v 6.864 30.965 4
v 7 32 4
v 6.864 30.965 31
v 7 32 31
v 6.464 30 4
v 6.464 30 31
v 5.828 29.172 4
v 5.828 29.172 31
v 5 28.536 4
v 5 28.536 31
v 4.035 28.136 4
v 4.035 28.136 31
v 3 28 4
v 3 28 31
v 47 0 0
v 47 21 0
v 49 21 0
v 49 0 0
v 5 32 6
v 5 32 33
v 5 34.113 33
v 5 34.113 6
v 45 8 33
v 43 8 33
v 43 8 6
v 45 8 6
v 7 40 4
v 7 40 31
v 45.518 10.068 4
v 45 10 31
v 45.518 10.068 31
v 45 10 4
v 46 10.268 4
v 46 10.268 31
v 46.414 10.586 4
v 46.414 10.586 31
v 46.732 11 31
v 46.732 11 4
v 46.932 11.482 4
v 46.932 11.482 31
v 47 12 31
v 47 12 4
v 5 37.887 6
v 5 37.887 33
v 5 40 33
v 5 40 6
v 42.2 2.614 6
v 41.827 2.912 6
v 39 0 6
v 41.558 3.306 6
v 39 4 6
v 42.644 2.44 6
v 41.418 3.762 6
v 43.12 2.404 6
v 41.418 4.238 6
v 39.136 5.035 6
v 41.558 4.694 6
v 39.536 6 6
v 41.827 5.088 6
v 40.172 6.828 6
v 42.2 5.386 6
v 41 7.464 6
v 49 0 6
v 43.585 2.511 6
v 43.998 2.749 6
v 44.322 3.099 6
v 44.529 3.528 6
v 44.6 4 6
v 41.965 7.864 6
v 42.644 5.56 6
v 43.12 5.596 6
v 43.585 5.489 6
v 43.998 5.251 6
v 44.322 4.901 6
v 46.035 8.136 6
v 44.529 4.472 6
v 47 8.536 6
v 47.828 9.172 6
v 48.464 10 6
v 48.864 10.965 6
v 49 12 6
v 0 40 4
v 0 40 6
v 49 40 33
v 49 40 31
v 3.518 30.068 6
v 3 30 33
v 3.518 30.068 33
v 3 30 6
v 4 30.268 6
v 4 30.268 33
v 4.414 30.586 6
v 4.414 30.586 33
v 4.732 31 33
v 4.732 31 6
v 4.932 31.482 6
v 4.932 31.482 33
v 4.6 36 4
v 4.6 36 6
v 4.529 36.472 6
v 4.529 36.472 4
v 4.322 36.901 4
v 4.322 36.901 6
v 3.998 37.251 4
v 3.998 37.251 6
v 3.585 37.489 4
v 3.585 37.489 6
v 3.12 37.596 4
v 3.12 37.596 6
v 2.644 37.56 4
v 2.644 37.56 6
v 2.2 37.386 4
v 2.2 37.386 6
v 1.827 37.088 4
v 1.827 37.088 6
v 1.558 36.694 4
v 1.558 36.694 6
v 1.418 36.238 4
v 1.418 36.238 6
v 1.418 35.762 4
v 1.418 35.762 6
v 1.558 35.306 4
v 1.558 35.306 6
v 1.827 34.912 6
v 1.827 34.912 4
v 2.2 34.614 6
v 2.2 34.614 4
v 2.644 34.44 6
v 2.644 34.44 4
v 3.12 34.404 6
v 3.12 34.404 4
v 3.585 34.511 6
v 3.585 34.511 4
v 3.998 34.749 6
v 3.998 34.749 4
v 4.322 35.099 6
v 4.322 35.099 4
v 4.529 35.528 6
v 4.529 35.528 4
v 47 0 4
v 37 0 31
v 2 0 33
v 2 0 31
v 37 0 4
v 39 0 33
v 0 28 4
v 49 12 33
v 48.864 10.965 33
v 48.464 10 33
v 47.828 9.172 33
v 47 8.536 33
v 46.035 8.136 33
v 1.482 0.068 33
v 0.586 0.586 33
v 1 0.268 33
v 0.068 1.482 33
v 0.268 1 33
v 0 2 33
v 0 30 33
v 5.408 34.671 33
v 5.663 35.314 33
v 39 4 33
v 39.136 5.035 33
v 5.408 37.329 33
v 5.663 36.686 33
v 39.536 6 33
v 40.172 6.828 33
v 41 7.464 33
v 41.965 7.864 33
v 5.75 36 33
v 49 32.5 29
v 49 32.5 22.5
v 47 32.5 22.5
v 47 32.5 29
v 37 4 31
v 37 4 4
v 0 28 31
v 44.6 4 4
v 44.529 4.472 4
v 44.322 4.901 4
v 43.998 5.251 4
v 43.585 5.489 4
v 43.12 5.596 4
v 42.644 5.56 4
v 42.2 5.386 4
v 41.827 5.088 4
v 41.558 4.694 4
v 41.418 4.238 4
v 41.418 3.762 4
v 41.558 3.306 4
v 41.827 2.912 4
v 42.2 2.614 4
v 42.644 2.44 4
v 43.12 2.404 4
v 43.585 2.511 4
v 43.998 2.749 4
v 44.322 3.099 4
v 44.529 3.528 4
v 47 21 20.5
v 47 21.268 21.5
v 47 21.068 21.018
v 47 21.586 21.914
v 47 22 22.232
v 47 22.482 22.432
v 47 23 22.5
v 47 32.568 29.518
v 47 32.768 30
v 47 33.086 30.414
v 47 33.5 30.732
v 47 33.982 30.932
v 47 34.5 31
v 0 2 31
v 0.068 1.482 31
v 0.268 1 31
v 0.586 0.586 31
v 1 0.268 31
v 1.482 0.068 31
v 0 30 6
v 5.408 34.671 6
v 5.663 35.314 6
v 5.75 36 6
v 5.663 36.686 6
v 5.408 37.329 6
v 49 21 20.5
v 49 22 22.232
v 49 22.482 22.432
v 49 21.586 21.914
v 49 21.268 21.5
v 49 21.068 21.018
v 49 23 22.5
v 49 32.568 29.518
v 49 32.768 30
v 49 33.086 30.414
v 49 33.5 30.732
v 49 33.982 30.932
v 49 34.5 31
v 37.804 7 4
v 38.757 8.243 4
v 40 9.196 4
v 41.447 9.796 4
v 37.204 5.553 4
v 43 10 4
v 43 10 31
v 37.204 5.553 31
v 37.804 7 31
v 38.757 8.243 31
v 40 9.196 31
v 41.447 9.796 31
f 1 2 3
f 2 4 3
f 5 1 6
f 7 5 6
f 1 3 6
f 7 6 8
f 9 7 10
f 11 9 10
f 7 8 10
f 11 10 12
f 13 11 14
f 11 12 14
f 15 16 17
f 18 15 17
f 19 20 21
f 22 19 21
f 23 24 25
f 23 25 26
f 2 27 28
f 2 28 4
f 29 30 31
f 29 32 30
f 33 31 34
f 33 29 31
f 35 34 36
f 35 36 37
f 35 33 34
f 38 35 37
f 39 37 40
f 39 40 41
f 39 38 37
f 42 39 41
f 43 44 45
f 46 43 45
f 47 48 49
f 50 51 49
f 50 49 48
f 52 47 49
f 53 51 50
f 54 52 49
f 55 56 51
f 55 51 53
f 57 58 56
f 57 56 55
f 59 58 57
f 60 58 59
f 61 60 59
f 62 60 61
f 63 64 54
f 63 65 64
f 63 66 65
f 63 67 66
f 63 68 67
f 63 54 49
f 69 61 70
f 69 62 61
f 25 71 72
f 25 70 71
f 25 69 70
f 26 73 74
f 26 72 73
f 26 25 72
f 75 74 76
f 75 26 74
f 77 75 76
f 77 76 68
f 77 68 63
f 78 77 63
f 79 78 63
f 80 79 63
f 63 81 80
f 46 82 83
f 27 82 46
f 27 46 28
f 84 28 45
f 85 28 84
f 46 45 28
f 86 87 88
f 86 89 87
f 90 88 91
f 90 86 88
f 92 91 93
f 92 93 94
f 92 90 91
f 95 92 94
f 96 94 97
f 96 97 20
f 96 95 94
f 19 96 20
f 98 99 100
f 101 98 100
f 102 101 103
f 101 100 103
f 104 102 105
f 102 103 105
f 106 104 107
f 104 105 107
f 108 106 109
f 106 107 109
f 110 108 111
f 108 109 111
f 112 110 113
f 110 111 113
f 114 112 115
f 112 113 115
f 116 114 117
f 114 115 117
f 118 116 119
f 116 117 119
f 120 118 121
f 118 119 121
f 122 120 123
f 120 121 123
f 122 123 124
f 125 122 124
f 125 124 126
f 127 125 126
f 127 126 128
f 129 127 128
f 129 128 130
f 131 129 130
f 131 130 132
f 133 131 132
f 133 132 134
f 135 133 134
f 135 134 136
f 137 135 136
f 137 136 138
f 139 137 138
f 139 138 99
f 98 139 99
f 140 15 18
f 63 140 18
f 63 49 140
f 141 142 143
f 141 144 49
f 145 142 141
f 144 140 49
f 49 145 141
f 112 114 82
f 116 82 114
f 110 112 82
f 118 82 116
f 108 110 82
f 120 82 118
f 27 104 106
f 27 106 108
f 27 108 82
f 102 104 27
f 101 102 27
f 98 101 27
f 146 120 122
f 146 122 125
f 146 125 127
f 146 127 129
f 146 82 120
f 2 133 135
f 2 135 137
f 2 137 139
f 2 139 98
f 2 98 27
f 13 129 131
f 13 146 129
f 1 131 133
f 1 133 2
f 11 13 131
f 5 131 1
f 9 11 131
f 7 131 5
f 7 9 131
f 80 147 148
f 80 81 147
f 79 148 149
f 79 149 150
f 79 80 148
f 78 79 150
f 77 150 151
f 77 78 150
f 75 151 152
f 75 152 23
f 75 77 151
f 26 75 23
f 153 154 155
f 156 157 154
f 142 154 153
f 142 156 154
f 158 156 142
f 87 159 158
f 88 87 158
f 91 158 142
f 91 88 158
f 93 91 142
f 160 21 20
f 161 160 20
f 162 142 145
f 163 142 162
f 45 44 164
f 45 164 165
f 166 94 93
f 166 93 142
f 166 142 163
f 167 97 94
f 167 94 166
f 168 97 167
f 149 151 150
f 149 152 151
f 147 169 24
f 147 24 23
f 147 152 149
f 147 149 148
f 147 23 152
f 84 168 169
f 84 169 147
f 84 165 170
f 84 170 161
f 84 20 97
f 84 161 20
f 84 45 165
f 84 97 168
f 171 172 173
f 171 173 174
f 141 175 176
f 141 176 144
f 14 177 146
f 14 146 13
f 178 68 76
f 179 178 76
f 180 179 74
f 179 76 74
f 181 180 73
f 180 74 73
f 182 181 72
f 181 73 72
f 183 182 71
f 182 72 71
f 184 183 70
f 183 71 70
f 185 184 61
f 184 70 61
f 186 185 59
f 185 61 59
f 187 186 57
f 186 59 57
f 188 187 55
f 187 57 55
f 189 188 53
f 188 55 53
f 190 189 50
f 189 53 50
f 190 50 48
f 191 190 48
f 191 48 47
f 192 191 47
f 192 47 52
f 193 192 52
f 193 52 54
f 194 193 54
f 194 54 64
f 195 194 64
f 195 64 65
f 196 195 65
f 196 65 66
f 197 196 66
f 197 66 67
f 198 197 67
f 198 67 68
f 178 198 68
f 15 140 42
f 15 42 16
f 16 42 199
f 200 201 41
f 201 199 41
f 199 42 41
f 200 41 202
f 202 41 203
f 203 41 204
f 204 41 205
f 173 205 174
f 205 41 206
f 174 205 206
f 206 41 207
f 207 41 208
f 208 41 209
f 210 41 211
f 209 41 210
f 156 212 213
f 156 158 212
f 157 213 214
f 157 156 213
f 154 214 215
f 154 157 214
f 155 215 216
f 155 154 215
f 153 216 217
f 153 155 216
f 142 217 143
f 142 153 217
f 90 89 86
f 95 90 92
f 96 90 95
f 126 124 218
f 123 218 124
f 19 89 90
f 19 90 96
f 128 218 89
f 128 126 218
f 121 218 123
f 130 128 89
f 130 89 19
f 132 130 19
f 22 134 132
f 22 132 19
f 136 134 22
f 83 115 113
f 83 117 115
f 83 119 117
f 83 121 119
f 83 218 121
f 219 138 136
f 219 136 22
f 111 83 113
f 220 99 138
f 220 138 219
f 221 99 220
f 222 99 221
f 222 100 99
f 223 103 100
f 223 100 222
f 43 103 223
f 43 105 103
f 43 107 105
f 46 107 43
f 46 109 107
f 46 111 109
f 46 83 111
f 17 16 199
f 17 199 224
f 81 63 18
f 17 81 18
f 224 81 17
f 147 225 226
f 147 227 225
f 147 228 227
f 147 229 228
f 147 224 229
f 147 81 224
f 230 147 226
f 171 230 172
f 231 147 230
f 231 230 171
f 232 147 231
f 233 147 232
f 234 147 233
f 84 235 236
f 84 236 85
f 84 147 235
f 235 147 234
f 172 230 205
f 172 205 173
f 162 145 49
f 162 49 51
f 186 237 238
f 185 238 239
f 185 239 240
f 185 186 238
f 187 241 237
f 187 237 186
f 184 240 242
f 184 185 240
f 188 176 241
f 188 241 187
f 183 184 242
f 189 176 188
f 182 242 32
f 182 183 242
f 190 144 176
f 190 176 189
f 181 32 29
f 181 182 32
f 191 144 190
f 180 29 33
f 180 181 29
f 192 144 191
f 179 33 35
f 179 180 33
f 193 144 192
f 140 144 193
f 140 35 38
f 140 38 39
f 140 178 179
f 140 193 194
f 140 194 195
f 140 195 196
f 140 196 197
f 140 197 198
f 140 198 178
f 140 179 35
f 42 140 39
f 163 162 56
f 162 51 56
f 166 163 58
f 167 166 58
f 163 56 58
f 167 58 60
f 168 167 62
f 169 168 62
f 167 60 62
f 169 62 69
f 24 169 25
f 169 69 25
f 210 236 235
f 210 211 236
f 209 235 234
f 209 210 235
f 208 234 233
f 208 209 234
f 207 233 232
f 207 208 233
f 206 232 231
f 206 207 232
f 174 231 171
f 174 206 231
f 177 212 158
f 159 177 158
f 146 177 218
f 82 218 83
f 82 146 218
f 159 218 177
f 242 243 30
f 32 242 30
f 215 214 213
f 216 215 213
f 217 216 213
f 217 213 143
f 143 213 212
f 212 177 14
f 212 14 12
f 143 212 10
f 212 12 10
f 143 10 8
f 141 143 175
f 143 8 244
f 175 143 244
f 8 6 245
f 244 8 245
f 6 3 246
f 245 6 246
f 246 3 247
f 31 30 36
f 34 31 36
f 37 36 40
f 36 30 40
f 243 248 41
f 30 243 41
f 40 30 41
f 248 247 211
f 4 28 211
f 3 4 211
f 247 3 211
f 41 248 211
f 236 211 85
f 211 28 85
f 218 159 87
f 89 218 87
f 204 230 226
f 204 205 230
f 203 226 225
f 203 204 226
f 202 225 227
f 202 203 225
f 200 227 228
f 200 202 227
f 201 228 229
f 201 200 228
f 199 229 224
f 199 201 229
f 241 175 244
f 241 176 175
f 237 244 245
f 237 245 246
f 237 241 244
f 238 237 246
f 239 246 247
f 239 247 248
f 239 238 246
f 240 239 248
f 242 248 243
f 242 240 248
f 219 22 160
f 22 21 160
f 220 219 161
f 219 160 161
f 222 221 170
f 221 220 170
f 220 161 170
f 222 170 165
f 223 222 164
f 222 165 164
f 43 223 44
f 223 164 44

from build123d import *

# Parameters (mm, degrees)
SKETCH_W        = 49
SKETCH_H        = 40
PAD_DEPTH       = 33
SKETCH001_W     = 47
SKETCH001_H     = 21
POCKET_DEPTH    = 31
SKETCH002_W     = 42
SKETCH002_H     = 19
POCKET001_DEPTH = 31
SKETCH003_W     = 7
SKETCH003_H     = 7
POCKET002_DEPTH = 31
SKETCH004_W     = 10
SKETCH004_H     = 10
PAD001_DEPTH    = 27
SKETCH005_W     = 10
SKETCH005_H     = 8
POCKET003_DEPTH = 27
SKETCH006_W     = 7
SKETCH006_H     = 12
POCKET004_DEPTH = 4
SKETCH007_W     = 5
SKETCH007_H     = 10
POCKET005_DEPTH = 27
FILLET_R        = 4
SKETCH008_R     = 1.6
POCKET006_DEPTH = 6.001
SKETCH009_R     = 1.6
POCKET007_DEPTH = 6.001
SKETCH010_R     = 2.75
POCKET008_DEPTH = 27
FILLET001_R     = 2
FILLET002_R     = 4
SKETCH011_W     = 11.5
SKETCH011_H     = 8.5
PAD002_DEPTH    = 2
FILLET003_R     = 2
FILLET004_R     = 4
FILLET005_R     = 6
FILLET006_R     = 2
FILLET007_R     = 2


with BuildPart() as part:
    # Sketch → Pad (new body)
    with BuildSketch(Plane.XY):
        with Locations((24.5, 20)):
            Rectangle(SKETCH_W, SKETCH_H)
    extrude(amount=PAD_DEPTH)

    # Sketch001 → Pocket (cut)
    with BuildSketch(Plane.XY):
        with Locations((23.5, 10.5)):
            Rectangle(SKETCH001_W, SKETCH001_H)
    extrude(amount=POCKET_DEPTH, mode=Mode.SUBTRACT)

    # Sketch002 (on Face4 of Pocket) → Pocket001 (cut)
    with BuildSketch(Plane(origin=(0, 0, 0), x_dir=(1, 0, 0), z_dir=(0, 0, -1))):
        with Locations((28, -30.5)):
            Rectangle(SKETCH002_W, SKETCH002_H)
    extrude(amount=-POCKET001_DEPTH, mode=Mode.SUBTRACT)

    # Sketch003 (on Face10 of Pocket001) → Pocket002 (cut)
    with BuildSketch(Plane(origin=(0, 0, 0), x_dir=(1, 0, 0), z_dir=(0, 0, -1))):
        with Locations((3.5, -24.5)):
            Rectangle(SKETCH003_W, SKETCH003_H)
    extrude(amount=-POCKET002_DEPTH, mode=Mode.SUBTRACT)

    # Sketch004 (on Face12 of Pocket002) → Pad001 (join)
    with BuildSketch(Plane(origin=(0, 0, 31), x_dir=(1, 0, 0), z_dir=(0, 0, -1))):
        with Locations((42, -5)):
            Rectangle(SKETCH004_W, SKETCH004_H)
    extrude(amount=PAD001_DEPTH)

    # Sketch005 (on Face7 of Pad001) → Pocket003 (cut)
    with BuildSketch(Plane.XY.offset(33)):
        with Locations((44, 4)):
            Rectangle(SKETCH005_W, SKETCH005_H)
    extrude(amount=-POCKET003_DEPTH, mode=Mode.SUBTRACT)

    # Sketch006 (on Face2 of Pocket003) → Pocket004 (cut)
    with BuildSketch(Plane(origin=(0, 0, 0), x_dir=(1, 0, 0), z_dir=(0, 0, -1))):
        with Locations((3.5, -34)):
            Rectangle(SKETCH006_W, SKETCH006_H)
    extrude(amount=-POCKET004_DEPTH, mode=Mode.SUBTRACT)

    # Sketch007 (on Face7 of Pocket004) → Pocket005 (cut)
    with BuildSketch(Plane.XY.offset(33)):
        with Locations((2.5, 35)):
            Rectangle(SKETCH007_W, SKETCH007_H)
    extrude(amount=-POCKET005_DEPTH, mode=Mode.SUBTRACT)

    # Fillet
    fillet_edges = [part.edges().sort_by_distance(p)[0] for p in [
        (39, 8, 19.5),
    ]]
    fillet(fillet_edges, radius=FILLET_R)

    # Sketch008 (on Face11 of Fillet) → Pocket006 (cut, through all)
    with BuildSketch(Plane.XY.offset(6)):
        with Locations((43, 4)):
            Circle(SKETCH008_R)
    extrude(amount=-POCKET006_DEPTH, mode=Mode.SUBTRACT)

    # Sketch009 (on Face16 of Pocket006) → Pocket007 (cut, through all)
    with BuildSketch(Plane.XY.offset(6)):
        with Locations((3, 36)):
            Circle(SKETCH009_R)
    extrude(amount=-POCKET007_DEPTH, mode=Mode.SUBTRACT)

    # Sketch010 (on Face1 of Pocket007) → Pocket008 (cut)
    with BuildSketch(Plane.XY.offset(33)):
        with Locations((3, 36)):
            Circle(SKETCH010_R)
    extrude(amount=-POCKET008_DEPTH, mode=Mode.SUBTRACT)

    # Fillet001
    fillet001_edges = [part.edges().sort_by_distance(p)[0] for p in [
        (5, 30, 19.5),
    ]]
    fillet(fillet001_edges, radius=FILLET001_R)

    # Fillet002
    fillet002_edges = [part.edges().sort_by_distance(p)[0] for p in [
        (49, 8, 19.5),
    ]]
    fillet(fillet002_edges, radius=FILLET002_R)

    # Sketch011 (on Face5 of Fillet002) → Pad002 (join)
    with BuildSketch(Plane.YZ.offset(49)):
        with Locations((26.75, 26.75)):
            Rectangle(SKETCH011_W, SKETCH011_H)
    extrude(amount=-PAD002_DEPTH)

    # Fillet003
    fillet003_edges = [part.edges().sort_by_distance(p)[0] for p in [
        (48, 21, 22.5),
        (48, 32.5, 31),
    ]]
    fillet(fillet003_edges, radius=FILLET003_R)

    # Fillet004
    fillet004_edges = [part.edges().sort_by_distance(p)[0] for p in [
        (7, 28, 17.5),
    ]]
    fillet(fillet004_edges, radius=FILLET004_R)

    # Fillet005
    fillet005_edges = [part.edges().sort_by_distance(p)[0] for p in [
        (37, 10, 17.5),
    ]]
    fillet(fillet005_edges, radius=FILLET005_R)

    # Fillet006
    fillet006_edges = [part.edges().sort_by_distance(p)[0] for p in [
        (47, 10, 17.5),
    ]]
    fillet(fillet006_edges, radius=FILLET006_R)

    # Fillet007
    fillet007_edges = [part.edges().sort_by_distance(p)[0] for p in [
        (0, 0, 32),
    ]]
    fillet(fillet007_edges, radius=FILLET007_R)


solid = part.part
